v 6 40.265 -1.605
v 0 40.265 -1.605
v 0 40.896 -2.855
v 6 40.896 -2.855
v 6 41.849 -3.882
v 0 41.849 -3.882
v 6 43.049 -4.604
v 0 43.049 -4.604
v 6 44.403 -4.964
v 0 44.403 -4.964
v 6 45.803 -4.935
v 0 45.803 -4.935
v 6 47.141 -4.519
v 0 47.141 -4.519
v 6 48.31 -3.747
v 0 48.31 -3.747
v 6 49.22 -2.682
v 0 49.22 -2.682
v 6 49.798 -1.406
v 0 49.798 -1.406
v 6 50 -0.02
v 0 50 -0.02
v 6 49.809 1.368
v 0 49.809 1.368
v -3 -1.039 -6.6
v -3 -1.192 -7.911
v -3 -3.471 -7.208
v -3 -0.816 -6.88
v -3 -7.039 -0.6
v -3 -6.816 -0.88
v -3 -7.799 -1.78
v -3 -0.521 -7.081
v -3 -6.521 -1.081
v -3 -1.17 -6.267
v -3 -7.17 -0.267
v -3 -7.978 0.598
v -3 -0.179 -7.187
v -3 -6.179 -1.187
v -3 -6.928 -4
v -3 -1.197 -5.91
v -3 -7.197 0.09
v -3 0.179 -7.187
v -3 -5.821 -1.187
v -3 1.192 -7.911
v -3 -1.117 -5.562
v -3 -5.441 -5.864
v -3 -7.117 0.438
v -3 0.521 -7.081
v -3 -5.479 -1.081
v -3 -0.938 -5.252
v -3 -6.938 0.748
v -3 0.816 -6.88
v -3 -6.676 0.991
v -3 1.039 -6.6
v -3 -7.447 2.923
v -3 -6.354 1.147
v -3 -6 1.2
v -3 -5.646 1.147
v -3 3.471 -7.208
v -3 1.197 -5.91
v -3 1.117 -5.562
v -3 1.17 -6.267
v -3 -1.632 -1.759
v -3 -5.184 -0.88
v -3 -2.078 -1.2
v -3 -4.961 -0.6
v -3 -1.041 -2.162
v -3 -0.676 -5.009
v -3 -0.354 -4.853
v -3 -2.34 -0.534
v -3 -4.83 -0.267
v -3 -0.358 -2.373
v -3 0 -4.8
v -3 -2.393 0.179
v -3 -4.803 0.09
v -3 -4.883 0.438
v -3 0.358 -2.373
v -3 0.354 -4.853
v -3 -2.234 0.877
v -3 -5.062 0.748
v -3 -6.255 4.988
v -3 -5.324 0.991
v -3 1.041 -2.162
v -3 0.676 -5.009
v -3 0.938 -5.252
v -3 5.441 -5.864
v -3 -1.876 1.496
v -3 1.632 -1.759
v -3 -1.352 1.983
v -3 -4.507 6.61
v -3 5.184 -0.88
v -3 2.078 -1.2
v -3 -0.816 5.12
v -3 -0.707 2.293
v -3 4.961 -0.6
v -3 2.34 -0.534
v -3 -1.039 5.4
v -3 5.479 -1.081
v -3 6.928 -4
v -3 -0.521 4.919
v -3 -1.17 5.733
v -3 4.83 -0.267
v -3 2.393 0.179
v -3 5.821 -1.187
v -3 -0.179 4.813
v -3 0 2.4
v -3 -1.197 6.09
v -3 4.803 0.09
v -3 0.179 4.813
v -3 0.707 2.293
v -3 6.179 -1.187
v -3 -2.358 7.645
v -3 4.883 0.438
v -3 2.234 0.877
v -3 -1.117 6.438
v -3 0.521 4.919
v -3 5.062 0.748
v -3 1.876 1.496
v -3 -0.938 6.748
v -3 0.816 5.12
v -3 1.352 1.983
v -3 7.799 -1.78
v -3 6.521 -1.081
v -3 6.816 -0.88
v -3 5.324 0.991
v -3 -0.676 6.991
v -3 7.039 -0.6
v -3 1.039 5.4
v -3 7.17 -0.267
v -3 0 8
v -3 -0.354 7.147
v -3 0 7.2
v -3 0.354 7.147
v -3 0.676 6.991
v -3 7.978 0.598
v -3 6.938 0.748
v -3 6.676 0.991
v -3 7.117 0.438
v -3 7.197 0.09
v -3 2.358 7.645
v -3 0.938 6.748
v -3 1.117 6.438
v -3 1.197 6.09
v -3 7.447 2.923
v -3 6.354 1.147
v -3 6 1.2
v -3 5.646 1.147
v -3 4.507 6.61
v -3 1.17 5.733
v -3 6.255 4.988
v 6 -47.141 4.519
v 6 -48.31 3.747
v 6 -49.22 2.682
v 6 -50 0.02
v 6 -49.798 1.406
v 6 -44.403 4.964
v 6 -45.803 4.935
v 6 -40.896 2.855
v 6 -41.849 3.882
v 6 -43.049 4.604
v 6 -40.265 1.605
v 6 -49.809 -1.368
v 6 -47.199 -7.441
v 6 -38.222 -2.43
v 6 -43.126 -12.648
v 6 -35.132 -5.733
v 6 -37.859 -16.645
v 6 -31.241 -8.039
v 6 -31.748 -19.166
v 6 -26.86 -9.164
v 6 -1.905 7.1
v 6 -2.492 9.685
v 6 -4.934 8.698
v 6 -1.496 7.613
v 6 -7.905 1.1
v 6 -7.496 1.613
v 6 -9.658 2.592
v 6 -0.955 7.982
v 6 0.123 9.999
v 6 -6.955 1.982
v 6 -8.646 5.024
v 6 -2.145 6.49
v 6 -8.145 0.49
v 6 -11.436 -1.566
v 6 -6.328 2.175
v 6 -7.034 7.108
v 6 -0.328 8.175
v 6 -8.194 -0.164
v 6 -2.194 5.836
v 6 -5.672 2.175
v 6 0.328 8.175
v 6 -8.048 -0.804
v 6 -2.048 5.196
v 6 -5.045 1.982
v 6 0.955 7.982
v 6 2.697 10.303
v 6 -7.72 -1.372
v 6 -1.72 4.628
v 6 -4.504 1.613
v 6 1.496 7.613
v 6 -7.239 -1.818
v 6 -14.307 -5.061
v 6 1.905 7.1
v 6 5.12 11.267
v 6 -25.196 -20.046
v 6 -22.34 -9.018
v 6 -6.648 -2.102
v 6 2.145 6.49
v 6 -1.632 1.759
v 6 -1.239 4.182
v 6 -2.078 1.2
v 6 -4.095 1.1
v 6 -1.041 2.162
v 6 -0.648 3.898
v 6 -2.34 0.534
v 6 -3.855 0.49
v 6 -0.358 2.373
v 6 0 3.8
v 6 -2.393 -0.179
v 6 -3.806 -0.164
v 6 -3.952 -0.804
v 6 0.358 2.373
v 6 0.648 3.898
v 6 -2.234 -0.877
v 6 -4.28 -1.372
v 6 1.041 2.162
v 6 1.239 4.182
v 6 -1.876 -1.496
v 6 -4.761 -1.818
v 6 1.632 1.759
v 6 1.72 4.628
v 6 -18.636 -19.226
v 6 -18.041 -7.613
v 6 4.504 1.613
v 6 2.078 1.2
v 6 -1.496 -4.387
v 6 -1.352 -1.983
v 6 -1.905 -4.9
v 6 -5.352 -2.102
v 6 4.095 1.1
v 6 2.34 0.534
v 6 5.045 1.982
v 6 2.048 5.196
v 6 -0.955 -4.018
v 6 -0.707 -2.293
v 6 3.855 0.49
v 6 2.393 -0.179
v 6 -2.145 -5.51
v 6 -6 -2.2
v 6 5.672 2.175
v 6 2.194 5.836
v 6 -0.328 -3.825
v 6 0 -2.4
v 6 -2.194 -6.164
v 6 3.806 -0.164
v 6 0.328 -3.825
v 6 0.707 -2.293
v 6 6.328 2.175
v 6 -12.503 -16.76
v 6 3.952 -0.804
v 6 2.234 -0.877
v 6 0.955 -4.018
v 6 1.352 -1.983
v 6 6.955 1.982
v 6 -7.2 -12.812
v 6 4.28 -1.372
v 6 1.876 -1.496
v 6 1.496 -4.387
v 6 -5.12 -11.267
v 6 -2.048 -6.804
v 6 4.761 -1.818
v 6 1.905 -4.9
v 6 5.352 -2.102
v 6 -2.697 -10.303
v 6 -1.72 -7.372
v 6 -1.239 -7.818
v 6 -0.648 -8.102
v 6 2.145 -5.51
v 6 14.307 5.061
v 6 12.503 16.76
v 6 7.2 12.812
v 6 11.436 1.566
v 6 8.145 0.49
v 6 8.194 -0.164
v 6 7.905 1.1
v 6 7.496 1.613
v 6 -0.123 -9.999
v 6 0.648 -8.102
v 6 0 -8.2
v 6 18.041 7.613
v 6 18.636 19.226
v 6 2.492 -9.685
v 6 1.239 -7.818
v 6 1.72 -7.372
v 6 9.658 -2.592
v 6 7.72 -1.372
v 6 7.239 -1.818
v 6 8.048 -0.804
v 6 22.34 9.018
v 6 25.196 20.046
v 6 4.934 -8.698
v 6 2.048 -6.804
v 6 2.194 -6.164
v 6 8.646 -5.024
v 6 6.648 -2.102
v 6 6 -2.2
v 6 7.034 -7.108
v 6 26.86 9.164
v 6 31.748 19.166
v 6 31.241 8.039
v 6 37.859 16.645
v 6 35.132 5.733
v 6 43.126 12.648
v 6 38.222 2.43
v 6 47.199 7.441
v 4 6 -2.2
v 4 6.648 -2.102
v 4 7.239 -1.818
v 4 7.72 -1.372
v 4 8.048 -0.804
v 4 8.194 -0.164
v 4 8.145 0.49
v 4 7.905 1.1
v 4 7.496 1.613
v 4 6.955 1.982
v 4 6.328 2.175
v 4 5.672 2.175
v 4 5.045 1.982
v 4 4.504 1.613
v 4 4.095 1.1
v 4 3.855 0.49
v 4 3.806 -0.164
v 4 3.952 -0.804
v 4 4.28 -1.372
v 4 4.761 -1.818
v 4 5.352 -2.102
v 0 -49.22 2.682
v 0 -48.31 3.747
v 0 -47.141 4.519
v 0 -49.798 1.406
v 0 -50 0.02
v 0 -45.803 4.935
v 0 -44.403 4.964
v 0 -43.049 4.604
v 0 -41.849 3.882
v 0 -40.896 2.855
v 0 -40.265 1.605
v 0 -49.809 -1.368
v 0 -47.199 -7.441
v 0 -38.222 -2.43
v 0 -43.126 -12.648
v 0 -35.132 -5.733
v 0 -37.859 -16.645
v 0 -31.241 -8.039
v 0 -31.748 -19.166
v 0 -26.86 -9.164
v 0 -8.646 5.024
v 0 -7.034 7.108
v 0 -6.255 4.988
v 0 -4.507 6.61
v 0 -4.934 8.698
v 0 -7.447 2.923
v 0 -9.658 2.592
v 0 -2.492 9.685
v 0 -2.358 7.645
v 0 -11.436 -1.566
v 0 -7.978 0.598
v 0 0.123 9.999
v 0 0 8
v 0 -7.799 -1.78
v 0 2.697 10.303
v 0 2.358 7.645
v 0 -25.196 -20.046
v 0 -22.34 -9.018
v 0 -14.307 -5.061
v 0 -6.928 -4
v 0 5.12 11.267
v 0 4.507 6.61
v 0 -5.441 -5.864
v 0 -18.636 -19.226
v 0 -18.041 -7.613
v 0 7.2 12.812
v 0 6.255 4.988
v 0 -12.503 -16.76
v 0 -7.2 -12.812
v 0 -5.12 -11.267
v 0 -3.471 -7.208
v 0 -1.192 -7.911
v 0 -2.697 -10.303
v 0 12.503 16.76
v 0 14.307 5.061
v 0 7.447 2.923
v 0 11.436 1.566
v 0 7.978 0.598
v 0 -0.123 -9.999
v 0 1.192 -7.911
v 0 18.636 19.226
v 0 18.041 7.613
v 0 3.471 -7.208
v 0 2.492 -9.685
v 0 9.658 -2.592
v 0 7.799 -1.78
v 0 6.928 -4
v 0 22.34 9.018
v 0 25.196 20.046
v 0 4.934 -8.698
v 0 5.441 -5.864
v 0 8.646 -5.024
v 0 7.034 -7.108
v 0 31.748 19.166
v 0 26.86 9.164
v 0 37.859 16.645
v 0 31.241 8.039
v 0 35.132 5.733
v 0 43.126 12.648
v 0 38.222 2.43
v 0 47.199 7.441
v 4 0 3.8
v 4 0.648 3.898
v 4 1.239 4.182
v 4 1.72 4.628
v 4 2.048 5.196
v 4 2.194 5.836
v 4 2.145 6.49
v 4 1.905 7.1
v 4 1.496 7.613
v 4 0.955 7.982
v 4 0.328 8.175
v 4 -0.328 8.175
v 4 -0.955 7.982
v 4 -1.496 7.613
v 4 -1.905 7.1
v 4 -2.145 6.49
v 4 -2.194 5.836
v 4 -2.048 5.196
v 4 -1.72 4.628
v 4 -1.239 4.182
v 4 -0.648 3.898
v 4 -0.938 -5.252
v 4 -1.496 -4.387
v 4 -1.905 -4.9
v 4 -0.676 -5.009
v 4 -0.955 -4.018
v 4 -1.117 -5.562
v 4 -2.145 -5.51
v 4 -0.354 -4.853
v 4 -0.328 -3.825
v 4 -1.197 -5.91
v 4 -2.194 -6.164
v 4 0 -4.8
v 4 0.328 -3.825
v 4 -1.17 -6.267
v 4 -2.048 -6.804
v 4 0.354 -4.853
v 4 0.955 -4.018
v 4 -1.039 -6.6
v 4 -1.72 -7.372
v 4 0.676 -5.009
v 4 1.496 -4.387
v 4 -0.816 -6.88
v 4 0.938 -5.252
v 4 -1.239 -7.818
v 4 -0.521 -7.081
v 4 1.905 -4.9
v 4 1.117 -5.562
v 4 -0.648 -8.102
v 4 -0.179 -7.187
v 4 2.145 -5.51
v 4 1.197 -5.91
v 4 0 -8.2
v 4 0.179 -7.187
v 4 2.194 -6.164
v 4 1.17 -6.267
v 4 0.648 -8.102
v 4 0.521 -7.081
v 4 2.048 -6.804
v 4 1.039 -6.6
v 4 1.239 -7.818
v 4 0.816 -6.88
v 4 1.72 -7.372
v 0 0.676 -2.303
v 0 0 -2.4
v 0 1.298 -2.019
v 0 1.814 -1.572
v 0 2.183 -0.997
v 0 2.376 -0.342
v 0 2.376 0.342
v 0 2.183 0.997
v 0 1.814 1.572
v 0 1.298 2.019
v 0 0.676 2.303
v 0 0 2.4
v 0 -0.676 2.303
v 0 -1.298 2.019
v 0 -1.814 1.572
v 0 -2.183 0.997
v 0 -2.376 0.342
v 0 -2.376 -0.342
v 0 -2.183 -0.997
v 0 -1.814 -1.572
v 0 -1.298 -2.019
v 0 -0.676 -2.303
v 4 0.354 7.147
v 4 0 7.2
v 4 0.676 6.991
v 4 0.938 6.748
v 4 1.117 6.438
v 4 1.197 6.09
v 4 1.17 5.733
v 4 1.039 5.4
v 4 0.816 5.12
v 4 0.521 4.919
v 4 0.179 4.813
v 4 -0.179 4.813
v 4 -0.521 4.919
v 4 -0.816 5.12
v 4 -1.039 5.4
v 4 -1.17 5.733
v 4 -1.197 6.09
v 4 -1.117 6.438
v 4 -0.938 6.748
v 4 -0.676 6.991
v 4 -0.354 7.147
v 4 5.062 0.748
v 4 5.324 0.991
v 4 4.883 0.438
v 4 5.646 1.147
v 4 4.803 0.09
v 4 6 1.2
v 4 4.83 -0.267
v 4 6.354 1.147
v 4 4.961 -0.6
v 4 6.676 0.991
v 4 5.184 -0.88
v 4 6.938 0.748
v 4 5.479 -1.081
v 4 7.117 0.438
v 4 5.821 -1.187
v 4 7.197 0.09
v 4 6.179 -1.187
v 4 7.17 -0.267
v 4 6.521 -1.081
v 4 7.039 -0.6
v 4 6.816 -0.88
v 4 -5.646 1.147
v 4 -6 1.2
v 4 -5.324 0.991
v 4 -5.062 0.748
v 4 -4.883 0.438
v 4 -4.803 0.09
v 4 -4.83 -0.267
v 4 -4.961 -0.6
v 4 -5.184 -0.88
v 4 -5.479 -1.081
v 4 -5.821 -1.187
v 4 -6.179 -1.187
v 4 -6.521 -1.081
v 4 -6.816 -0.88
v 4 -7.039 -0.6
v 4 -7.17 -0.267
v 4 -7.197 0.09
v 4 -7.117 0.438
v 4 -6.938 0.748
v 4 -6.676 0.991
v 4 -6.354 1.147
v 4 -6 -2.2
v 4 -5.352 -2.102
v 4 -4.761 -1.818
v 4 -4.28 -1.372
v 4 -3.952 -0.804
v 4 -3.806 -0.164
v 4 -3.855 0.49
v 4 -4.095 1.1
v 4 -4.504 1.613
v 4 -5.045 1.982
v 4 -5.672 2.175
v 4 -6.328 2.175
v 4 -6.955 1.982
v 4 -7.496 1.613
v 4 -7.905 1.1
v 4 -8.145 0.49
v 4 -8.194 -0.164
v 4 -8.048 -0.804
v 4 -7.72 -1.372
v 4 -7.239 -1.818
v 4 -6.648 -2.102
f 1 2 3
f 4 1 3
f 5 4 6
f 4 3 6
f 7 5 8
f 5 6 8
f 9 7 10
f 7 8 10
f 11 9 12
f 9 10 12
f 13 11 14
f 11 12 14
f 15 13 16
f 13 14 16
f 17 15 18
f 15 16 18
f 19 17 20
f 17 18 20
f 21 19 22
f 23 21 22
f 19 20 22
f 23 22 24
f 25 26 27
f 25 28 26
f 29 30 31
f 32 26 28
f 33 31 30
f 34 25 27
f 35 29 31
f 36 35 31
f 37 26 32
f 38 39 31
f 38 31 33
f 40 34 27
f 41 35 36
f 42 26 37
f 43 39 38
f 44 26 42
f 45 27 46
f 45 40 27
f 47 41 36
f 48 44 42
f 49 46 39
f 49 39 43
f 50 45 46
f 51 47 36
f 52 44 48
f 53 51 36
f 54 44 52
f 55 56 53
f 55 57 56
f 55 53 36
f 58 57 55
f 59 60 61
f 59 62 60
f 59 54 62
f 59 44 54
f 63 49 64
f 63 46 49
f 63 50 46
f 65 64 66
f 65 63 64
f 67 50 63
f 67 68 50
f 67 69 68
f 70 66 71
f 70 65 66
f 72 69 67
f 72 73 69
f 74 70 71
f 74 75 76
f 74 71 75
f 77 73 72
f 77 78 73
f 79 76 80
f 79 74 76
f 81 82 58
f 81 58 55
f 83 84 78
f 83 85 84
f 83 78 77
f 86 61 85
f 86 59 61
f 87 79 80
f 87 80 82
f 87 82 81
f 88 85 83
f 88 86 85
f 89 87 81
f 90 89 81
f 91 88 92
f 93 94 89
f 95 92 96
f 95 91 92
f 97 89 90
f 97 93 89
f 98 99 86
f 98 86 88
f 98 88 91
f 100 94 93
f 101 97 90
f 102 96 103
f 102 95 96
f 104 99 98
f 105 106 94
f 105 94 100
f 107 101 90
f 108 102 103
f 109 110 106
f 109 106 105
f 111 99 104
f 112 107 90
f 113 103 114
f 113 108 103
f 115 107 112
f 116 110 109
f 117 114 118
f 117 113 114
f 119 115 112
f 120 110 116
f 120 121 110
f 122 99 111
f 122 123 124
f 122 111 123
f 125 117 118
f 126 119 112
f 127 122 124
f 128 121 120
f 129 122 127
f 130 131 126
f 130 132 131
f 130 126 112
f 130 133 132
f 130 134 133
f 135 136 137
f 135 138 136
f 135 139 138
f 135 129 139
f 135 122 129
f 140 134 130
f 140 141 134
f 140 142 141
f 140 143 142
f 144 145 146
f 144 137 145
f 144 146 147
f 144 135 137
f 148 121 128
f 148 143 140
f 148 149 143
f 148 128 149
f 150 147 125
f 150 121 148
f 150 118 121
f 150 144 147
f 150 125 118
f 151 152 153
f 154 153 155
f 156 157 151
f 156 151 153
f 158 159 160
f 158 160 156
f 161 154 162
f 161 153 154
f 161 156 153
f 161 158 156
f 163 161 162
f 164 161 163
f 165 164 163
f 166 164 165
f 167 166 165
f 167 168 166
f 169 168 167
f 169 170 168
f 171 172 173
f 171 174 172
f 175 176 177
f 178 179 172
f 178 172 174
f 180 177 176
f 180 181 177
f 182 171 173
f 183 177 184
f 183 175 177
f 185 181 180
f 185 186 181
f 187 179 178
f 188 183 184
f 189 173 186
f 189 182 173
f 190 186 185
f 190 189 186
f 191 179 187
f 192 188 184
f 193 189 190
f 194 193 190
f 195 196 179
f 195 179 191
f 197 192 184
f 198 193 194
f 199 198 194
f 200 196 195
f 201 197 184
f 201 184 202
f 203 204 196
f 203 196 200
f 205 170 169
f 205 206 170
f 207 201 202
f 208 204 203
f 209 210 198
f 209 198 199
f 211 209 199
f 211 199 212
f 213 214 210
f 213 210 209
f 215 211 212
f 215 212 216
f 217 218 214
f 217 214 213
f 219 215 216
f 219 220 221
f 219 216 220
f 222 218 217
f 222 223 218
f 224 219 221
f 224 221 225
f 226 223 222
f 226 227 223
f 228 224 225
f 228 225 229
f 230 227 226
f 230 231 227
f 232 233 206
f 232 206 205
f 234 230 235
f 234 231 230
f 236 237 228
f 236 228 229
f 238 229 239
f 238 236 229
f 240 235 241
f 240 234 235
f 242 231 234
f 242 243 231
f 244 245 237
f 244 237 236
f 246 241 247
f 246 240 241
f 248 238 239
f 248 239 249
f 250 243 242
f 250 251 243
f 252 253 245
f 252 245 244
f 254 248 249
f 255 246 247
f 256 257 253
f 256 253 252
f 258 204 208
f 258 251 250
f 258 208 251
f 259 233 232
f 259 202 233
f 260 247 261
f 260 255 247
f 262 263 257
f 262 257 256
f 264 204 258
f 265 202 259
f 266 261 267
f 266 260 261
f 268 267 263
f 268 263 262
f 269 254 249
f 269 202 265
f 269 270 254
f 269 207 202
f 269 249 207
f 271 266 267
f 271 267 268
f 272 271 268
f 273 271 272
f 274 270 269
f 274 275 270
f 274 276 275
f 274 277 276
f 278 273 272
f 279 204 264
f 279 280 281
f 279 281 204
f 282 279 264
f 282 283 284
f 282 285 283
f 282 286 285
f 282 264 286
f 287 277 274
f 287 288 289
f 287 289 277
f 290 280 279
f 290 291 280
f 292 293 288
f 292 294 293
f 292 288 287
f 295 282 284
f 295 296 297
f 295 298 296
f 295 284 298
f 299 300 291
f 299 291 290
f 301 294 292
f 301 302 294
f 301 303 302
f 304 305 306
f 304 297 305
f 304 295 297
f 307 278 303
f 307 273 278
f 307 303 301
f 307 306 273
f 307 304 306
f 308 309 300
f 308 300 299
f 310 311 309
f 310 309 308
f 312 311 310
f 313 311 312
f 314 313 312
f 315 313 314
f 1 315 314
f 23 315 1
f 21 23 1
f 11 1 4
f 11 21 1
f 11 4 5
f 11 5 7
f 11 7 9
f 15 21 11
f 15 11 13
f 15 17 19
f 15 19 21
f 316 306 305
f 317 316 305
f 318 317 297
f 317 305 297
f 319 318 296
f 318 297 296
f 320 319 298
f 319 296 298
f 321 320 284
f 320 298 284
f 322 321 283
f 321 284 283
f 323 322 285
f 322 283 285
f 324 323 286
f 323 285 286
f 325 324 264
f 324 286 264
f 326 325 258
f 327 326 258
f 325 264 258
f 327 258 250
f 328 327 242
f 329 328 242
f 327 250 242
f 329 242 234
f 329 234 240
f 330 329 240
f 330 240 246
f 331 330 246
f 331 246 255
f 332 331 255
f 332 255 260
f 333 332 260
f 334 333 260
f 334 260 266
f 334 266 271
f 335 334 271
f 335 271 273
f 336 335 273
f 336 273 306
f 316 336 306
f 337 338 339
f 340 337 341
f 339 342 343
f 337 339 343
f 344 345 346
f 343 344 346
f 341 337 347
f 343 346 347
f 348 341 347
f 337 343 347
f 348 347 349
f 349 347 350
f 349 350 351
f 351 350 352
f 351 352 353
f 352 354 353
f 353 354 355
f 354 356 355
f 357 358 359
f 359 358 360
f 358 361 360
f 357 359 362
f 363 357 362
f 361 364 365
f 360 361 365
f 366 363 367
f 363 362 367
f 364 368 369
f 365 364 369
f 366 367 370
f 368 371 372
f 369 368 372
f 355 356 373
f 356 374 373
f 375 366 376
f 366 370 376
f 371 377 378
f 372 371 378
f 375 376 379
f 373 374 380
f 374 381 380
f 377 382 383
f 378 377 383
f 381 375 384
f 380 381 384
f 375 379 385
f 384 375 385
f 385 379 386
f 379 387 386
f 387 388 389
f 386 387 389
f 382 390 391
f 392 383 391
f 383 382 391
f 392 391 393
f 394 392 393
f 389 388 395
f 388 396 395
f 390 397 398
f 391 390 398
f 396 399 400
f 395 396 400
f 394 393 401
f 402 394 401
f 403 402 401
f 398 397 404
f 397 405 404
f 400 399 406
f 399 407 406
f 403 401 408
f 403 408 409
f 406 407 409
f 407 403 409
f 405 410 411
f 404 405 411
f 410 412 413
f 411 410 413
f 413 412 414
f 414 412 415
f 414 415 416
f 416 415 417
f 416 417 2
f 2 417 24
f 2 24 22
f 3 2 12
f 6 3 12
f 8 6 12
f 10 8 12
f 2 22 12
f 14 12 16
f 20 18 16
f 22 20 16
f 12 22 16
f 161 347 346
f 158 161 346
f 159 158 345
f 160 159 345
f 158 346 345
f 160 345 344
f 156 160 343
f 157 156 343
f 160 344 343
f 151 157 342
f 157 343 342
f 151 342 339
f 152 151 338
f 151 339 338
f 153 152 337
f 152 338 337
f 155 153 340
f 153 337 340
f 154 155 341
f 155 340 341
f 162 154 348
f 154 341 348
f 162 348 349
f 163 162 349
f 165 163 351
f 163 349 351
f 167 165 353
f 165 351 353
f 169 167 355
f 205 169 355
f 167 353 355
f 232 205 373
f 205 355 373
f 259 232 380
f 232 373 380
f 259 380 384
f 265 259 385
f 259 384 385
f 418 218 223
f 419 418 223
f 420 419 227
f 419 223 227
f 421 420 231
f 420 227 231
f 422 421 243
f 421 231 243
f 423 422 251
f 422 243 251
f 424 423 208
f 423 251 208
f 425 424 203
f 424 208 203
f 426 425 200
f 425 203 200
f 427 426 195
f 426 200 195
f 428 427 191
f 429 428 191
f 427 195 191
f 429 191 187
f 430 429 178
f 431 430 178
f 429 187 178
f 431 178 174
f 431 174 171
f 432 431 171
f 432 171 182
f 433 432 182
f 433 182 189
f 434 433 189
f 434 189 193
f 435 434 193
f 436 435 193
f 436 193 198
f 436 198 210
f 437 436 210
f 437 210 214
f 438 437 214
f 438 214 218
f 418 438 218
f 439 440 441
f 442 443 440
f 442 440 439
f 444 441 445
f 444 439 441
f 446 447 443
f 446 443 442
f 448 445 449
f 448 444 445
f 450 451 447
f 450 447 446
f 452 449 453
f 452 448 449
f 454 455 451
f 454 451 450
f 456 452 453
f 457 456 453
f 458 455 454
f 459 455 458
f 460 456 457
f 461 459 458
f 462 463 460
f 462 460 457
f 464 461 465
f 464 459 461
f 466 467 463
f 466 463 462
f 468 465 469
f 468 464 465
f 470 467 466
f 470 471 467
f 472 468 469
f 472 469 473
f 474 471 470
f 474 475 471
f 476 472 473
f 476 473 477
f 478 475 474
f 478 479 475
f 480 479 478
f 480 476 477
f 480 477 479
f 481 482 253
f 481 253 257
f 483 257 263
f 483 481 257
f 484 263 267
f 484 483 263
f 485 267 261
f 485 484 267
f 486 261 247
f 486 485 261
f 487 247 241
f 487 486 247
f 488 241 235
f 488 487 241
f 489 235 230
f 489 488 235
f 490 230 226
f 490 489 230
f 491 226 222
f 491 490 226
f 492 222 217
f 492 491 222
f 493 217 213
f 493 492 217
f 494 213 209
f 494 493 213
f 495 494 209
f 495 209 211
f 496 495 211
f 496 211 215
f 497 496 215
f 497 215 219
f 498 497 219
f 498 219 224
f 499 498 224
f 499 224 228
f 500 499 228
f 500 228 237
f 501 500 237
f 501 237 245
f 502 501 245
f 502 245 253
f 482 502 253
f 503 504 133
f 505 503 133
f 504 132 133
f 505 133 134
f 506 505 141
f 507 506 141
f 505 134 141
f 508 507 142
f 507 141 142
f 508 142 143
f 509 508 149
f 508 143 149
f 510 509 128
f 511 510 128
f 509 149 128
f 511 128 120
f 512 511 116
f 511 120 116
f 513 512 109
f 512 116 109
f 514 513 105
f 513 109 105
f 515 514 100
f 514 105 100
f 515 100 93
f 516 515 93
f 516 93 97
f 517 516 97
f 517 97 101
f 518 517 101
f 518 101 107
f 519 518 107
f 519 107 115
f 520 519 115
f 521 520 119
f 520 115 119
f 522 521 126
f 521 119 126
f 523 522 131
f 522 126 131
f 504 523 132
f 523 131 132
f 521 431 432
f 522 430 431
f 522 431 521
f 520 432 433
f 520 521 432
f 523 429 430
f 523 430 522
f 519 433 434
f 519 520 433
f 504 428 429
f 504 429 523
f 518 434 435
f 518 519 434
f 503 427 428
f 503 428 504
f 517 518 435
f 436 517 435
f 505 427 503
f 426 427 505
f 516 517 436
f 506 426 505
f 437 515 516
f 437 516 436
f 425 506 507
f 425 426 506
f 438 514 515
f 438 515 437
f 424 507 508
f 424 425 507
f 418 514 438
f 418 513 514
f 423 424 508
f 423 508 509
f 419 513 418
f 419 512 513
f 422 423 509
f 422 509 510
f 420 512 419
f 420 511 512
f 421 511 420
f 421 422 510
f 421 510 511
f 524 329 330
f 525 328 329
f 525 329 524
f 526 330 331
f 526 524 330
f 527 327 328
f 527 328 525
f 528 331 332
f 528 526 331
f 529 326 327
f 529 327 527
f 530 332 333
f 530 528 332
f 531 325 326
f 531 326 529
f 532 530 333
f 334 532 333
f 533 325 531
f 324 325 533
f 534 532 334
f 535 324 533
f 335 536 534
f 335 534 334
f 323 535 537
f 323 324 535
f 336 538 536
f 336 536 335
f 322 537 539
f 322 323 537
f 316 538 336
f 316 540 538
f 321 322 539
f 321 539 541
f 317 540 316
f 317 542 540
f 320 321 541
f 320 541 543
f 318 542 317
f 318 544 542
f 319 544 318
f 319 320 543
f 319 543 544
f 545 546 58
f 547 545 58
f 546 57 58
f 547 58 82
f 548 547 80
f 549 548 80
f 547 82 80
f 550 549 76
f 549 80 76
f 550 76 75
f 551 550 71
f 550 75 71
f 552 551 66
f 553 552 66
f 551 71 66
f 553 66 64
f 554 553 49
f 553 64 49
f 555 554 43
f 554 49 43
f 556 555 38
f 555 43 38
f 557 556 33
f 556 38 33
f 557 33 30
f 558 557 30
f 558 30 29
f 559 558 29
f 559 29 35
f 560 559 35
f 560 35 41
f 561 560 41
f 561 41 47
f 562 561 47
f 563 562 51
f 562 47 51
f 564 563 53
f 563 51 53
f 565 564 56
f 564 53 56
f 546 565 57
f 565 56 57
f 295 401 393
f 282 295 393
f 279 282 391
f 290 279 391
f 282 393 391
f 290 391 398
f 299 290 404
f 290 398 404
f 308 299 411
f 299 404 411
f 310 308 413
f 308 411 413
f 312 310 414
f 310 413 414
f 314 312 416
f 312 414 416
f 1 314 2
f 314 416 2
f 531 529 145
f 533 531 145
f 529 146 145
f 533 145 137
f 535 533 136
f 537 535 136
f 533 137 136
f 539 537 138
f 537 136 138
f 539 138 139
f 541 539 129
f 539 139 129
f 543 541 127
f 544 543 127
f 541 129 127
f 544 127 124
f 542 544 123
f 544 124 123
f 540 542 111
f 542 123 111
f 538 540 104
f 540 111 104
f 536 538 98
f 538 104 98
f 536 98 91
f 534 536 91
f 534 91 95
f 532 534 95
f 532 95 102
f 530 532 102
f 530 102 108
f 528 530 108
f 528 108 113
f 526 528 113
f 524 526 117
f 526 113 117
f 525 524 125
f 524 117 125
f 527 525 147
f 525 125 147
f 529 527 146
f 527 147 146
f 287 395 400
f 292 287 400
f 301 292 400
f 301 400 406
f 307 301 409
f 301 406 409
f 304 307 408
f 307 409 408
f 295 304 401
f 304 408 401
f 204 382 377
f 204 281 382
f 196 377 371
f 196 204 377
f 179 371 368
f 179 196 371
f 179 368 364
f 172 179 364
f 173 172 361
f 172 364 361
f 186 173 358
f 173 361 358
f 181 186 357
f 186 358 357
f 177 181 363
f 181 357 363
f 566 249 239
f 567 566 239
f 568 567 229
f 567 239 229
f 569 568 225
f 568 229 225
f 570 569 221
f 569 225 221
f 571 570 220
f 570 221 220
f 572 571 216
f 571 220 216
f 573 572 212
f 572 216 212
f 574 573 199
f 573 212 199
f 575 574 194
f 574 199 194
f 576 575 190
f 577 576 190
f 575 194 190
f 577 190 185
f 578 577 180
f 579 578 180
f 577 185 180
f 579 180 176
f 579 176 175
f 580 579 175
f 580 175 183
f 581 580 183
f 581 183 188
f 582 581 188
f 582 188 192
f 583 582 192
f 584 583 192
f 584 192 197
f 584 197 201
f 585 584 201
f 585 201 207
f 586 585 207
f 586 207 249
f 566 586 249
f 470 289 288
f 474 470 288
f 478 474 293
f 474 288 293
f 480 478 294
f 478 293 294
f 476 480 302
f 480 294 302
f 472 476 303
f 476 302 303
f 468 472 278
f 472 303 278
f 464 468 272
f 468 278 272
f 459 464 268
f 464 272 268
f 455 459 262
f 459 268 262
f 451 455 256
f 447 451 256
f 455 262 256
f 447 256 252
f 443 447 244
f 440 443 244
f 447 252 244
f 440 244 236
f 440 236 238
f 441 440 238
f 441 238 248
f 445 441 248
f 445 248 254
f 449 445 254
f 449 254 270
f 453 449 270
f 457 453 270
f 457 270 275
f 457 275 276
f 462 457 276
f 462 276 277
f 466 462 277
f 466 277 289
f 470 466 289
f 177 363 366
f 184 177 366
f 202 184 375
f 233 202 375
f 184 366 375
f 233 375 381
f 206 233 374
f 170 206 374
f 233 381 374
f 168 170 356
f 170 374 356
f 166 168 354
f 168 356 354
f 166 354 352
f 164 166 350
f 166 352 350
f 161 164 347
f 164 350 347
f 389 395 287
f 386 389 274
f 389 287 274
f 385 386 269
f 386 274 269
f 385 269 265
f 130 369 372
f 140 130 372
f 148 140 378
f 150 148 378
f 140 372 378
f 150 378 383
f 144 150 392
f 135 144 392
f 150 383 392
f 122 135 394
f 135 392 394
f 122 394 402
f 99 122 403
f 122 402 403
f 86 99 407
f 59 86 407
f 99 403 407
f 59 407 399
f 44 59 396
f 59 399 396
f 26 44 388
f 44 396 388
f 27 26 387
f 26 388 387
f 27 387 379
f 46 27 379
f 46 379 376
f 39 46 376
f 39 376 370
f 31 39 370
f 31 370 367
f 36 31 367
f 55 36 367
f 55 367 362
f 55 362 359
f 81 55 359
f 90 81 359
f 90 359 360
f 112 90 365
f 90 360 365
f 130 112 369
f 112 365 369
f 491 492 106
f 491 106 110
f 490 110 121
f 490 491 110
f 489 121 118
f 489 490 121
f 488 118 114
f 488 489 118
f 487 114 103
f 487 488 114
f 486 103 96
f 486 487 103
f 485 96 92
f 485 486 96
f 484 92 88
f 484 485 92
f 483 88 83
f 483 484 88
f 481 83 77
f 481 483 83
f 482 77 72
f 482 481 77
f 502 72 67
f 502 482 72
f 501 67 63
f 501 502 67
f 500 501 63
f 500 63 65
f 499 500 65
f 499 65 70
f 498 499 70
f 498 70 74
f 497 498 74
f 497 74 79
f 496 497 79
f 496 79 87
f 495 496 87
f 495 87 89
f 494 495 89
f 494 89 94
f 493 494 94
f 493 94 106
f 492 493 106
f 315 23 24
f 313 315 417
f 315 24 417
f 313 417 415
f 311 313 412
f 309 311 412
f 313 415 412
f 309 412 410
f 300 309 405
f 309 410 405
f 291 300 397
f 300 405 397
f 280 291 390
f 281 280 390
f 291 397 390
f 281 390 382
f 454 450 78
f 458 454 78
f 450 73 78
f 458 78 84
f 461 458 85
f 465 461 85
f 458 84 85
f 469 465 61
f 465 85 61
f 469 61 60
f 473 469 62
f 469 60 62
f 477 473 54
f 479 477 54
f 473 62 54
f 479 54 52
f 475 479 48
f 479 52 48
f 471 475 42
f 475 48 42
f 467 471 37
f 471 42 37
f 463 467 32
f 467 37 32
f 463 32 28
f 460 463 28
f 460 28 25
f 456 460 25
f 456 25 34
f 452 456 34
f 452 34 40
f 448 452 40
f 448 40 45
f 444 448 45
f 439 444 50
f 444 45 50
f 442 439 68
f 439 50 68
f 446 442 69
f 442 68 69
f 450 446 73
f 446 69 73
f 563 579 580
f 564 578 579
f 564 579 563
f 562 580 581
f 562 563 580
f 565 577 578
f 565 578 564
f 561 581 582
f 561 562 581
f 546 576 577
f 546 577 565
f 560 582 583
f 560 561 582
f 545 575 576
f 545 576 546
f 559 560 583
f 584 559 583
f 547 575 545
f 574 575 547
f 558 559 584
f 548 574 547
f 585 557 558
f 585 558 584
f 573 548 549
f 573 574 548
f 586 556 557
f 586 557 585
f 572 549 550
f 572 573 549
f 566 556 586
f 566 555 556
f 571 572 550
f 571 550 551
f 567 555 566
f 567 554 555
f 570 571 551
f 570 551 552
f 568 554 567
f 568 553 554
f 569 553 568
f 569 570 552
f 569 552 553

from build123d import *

# Parameters (mm, degrees)
SKETCH1_R                      = 2.4
BOSS_EXTRUDE1_DEPTH            = 6
SKETCH2_R                      = 8
SKETCH2_R_2                    = 2.4
BOSS_EXTRUDE2_DEPTH            = 3
CBORE_FOR_M2_SHCS1_D           = 2.4
CBORE_FOR_M2_SHCS1_CBORE_D     = 4.4
CBORE_FOR_M2_SHCS1_CBORE_DEPTH = 2
FILLET1_R                      = 10


with BuildPart() as part:
    # Sketch1 → Boss-Extrude1 (new body)
    with BuildSketch(Plane(origin=(0, 0, 0), x_dir=(0, 0, -1), z_dir=(1, 0, 0))):
        with BuildLine():
            ThreePointArc((9.139568575, -4.058113633), (9.024618995, 4.307696832), (2.592436286, 9.658119595))
            ThreePointArc((2.592436286, 9.658119595), (-9.251342607, 24.595099021), (1.604842351, 40.264550225))
            ThreePointArc((1.604842351, 40.264550225), (4.773868283, 46.4866715), (-1.367582481, 49.809336247))
            ThreePointArc((-1.367582481, 49.809336247), (-19.682903104, 29.384906165), (-9.139568476, 4.058113857))
            ThreePointArc((-9.139568476, 4.058113857), (-9.024618995, -4.307696832), (-2.592436049, -9.658119658))
            ThreePointArc((-2.592436049, -9.658119658), (9.25134321, -24.595098795), (-1.604841364, -40.264550265))
            ThreePointArc((-1.604841364, -40.264550265), (-4.773867143, -46.486671617), (1.367583702, -49.809336214))
            ThreePointArc((1.367583702, -49.809336214), (19.682903824, -29.384905682), (9.139568575, -4.058113633))
        make_face()
        Circle(SKETCH1_R, mode=Mode.SUBTRACT)
    extrude(amount=BOSS_EXTRUDE1_DEPTH)

    # Sketch2 → Boss-Extrude2 (add)
    with BuildSketch(Plane.ZY):
        Circle(SKETCH2_R)
        Circle(SKETCH2_R_2, mode=Mode.SUBTRACT)
    extrude(amount=BOSS_EXTRUDE2_DEPTH)

    # CBORE for M2 SHCS1 (through all)
    with Locations(Plane(origin=(6, 0, 0), x_dir=(0, 0, -1), z_dir=(1, 0, 0))):
        with Locations((0, -6), (-6, 0), (0, 6), (6, 0)):
            CounterBoreHole(CBORE_FOR_M2_SHCS1_D / 2, CBORE_FOR_M2_SHCS1_CBORE_D / 2, CBORE_FOR_M2_SHCS1_CBORE_DEPTH)

    # Fillet1
    fillet1_edges = [part.edges().sort_by_distance(p)[0] for p in [
        (3, 4.058113857, 9.139568476),
        (3, -4.058113633, -9.139568575),
    ]]
    fillet(fillet1_edges, radius=FILLET1_R)


solid = part.part
